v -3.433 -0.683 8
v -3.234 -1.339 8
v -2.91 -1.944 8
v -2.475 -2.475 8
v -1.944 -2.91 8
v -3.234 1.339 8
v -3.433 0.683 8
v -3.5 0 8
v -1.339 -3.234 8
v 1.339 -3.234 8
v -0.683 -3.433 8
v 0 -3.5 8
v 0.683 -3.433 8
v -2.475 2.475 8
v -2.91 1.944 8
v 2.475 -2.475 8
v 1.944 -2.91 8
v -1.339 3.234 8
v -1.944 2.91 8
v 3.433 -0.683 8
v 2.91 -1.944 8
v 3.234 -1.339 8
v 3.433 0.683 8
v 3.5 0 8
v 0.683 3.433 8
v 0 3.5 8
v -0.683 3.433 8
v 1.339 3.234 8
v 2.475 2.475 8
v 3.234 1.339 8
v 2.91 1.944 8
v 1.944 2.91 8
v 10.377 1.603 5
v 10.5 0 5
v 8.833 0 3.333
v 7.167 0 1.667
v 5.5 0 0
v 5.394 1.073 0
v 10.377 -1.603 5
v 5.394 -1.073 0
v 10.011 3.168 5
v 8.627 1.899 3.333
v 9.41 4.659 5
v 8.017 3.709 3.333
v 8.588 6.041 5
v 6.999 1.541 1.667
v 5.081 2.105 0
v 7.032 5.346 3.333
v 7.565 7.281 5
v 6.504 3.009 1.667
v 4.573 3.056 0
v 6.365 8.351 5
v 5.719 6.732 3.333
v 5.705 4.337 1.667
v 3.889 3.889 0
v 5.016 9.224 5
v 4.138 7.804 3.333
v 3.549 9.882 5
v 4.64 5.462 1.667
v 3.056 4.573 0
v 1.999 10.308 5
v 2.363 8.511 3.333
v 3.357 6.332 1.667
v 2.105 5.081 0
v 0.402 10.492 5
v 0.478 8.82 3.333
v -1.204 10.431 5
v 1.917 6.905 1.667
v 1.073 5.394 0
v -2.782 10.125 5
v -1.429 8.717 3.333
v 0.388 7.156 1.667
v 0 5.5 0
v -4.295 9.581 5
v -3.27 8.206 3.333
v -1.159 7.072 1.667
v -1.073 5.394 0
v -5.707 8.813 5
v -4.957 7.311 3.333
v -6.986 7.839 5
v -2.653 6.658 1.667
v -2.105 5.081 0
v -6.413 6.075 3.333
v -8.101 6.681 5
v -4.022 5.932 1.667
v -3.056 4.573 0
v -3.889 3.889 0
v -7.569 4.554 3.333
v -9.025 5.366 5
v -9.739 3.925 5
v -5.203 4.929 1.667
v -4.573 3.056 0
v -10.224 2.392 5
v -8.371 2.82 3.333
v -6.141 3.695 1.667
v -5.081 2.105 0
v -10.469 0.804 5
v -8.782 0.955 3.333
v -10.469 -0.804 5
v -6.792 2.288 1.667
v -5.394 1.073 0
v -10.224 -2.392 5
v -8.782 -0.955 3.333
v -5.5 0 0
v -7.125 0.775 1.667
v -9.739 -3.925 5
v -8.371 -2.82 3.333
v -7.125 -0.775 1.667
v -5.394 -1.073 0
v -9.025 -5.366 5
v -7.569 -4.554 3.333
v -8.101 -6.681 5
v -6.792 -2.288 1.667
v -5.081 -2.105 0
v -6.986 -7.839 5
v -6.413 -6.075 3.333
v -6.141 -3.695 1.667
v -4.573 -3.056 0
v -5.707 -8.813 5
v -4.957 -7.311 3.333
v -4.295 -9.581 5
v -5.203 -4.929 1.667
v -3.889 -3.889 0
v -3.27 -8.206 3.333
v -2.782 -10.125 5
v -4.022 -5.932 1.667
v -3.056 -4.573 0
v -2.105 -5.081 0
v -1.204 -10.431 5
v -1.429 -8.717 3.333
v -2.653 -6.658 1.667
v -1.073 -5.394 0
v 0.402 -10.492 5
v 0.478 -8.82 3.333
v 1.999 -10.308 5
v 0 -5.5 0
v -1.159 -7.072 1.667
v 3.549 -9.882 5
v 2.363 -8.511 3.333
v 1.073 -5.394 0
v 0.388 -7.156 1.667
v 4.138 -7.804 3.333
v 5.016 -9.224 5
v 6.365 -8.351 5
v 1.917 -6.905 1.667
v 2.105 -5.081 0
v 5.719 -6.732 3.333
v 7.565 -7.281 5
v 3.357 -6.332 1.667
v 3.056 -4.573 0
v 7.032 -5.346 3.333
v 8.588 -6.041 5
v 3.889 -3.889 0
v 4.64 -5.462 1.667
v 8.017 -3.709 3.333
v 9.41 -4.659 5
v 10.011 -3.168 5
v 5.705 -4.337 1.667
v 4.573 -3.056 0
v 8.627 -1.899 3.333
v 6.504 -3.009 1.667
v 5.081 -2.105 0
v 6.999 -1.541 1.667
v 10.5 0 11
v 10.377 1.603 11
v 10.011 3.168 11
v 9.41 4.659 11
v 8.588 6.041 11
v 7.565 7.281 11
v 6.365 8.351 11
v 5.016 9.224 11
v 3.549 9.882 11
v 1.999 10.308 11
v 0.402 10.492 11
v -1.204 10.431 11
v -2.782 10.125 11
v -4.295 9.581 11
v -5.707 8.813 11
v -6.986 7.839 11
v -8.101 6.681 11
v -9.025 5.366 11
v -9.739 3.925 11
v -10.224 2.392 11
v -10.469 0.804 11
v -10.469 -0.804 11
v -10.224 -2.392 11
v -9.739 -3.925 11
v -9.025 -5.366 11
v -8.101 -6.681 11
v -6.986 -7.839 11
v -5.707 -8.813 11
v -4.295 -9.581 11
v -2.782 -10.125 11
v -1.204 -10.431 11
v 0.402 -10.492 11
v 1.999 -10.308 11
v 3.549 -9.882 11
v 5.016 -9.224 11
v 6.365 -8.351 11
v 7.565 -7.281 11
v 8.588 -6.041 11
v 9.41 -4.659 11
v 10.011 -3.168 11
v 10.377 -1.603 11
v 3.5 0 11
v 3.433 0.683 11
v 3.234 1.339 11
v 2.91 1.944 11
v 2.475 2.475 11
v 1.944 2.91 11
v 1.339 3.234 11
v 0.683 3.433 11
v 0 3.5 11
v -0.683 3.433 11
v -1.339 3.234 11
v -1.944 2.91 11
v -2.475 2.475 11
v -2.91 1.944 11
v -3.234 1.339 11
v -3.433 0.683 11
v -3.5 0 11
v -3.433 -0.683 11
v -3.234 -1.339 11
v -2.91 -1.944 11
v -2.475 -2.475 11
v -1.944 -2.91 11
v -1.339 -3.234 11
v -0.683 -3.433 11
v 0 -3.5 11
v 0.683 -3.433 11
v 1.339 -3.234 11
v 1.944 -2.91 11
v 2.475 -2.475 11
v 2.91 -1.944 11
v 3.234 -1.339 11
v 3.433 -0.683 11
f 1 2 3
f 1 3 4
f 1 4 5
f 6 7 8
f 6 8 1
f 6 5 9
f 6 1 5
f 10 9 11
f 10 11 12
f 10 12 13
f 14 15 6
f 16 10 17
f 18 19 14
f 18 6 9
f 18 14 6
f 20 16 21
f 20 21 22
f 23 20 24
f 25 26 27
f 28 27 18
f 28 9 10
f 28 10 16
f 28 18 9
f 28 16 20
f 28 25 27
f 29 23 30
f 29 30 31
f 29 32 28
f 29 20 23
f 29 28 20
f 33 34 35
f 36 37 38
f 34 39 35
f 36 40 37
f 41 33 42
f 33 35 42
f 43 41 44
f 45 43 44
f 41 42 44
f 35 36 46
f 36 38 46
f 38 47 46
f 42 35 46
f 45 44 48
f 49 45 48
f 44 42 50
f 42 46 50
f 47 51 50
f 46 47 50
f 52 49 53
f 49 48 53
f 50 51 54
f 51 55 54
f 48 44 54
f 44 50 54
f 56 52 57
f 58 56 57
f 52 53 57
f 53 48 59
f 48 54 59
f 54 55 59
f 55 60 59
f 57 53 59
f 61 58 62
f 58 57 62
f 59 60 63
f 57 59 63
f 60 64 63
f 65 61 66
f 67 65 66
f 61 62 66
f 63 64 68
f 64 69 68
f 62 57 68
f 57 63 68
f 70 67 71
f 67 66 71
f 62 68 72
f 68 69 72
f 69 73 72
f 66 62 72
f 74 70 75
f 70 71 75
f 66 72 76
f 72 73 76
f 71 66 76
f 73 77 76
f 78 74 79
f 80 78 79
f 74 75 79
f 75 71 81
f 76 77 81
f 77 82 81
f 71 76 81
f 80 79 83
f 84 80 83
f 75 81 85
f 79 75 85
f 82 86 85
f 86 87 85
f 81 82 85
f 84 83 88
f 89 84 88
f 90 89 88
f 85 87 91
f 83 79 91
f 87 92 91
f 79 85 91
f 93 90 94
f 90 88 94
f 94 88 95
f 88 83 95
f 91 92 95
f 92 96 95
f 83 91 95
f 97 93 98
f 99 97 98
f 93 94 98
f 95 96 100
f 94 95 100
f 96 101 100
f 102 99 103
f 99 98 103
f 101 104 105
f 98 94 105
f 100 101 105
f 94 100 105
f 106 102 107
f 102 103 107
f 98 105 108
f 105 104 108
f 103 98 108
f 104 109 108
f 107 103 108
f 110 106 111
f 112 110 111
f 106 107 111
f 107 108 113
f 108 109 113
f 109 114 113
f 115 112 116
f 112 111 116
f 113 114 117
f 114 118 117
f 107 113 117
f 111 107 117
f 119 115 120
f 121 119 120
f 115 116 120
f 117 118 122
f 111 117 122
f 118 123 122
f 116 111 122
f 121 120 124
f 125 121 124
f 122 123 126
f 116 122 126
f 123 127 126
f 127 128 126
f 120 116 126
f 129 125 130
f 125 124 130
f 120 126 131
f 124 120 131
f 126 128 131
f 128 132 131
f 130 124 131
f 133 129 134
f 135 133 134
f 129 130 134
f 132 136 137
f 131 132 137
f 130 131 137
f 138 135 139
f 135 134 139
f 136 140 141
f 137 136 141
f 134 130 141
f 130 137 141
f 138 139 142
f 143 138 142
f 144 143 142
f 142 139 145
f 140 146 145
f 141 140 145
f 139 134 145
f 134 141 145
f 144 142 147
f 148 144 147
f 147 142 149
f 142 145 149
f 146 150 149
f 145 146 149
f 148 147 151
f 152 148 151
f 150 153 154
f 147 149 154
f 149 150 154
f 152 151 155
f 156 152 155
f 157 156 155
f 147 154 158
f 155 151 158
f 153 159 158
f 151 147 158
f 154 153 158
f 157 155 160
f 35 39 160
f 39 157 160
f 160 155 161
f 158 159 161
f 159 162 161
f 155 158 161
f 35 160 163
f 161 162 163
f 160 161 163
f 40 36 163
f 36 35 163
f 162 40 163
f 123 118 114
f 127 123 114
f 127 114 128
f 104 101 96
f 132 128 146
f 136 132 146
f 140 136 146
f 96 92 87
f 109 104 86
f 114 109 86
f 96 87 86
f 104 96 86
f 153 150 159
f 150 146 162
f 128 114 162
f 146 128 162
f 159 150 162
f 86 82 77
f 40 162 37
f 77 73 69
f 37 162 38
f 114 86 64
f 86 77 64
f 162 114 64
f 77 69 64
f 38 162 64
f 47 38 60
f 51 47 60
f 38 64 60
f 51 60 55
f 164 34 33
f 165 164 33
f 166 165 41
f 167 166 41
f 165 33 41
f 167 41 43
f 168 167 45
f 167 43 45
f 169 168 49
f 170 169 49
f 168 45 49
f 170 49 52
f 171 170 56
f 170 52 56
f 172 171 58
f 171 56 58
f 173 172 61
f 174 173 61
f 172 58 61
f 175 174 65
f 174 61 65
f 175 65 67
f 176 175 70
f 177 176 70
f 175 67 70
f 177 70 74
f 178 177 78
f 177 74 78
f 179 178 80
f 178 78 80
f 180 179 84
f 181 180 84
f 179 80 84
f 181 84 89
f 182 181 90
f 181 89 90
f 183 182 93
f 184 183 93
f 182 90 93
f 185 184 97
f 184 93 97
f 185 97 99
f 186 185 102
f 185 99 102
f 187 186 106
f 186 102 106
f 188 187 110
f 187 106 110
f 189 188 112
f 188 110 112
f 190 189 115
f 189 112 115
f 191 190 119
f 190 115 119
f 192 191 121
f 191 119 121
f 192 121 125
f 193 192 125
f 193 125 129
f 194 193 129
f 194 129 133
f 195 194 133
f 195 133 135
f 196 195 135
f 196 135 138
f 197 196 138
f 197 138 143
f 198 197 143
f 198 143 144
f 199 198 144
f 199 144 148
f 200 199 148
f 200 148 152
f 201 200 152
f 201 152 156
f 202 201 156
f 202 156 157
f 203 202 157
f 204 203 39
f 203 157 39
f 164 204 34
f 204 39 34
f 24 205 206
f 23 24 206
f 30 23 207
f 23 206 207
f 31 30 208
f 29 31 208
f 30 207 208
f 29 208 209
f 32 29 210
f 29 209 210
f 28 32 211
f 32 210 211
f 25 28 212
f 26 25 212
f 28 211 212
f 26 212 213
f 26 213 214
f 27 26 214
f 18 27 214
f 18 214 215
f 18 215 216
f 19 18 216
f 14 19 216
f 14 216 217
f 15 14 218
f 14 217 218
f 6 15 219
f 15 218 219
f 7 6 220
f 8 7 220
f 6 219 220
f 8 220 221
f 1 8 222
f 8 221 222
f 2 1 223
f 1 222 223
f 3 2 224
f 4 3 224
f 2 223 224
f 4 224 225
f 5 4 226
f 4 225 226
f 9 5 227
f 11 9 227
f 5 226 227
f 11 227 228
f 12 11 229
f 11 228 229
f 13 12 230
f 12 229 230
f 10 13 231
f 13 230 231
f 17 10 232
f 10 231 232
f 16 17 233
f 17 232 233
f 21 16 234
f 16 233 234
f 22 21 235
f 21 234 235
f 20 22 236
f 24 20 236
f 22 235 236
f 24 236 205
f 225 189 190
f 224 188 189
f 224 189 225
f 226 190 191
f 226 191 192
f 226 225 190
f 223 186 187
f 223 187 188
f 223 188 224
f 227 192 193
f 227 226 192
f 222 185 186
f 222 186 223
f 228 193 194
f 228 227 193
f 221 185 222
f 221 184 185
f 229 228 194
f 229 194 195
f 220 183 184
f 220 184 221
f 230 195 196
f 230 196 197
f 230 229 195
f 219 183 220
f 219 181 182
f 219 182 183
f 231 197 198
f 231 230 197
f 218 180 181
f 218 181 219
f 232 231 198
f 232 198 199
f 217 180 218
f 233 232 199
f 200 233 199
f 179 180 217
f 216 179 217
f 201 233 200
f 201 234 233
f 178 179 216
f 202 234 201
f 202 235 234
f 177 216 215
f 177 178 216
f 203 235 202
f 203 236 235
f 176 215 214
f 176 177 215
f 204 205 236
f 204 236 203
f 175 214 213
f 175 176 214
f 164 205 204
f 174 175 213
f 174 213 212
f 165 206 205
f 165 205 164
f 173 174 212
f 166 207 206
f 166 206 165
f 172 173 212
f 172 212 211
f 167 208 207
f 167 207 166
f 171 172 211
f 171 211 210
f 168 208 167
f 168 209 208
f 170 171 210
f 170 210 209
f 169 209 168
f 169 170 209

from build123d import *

# Parameters (mm, degrees)
F0_R     = 10.5
F1_DEPTH = 11
F2_R     = 3.5
F3_DEPTH = 3
F4_SIZE  = 5


with BuildPart() as f1:
    # F0 (on Top) → F1 (new body)
    with BuildSketch(Plane.XY):
        Circle(F0_R)
    extrude(amount=F1_DEPTH)

    # F2 (on face) → F3 (cut)
    with BuildSketch(Plane.XY.offset(11)):
        Circle(F2_R)
    extrude(amount=-F3_DEPTH, mode=Mode.SUBTRACT)

    # F4
    f4_edges = [f1.edges().sort_by_distance(p)[0] for p in [
        (-10.5, 0, 0),
    ]]
    chamfer(f4_edges, length=F4_SIZE)


solid = f1.part
